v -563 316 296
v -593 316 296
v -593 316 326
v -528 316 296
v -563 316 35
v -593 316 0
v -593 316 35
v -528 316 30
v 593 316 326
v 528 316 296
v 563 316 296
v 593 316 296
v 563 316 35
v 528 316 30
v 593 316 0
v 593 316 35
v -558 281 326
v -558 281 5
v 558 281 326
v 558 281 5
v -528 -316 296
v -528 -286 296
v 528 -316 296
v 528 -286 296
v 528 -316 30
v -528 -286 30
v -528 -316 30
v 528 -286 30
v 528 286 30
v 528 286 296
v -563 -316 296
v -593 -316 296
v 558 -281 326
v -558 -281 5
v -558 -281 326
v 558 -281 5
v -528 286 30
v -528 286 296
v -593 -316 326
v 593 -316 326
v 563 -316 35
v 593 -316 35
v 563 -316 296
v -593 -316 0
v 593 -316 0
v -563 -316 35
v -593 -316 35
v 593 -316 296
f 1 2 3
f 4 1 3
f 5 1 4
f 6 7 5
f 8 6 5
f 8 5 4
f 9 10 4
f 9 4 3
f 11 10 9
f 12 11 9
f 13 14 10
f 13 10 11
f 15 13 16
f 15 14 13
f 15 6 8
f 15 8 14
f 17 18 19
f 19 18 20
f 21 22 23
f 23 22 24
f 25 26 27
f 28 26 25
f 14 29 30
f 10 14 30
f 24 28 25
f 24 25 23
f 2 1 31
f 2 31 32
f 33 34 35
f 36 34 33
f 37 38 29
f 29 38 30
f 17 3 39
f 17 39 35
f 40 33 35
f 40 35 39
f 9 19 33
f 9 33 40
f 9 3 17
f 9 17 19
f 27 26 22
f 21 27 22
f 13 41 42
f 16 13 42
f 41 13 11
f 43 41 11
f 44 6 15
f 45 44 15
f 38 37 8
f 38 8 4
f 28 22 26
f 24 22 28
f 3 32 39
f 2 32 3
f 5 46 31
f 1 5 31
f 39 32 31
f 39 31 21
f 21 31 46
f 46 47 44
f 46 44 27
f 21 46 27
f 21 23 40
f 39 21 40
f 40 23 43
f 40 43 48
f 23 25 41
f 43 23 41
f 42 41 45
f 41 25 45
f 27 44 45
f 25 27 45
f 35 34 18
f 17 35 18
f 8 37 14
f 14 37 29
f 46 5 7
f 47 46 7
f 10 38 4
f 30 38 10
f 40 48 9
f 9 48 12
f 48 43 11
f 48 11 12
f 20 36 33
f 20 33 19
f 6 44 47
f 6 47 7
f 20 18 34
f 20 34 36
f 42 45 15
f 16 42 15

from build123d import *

# Parameters (mm, degrees)
SKETCH_W          = 1186
SKETCH_H          = 632
PAD_DEPTH         = 326
SKETCH001_W       = 30
SKETCH001_H       = 261
POCKET_DEPTH      = 3081.716821
POCKET_DEPTH_BACK = 3081.716821
SKETCH002_W       = 1056
SKETCH002_H       = 266
POCKET001_DEPTH   = 30
SKETCH003_W       = 1116
SKETCH003_H       = 562
POCKET002_DEPTH   = 321.001


with BuildPart() as part:
    # Sketch → Pad (new body)
    with BuildSketch(Plane.XY):
        Rectangle(SKETCH_W, SKETCH_H)
    extrude(amount=PAD_DEPTH)

    # Sketch001 → Pocket (cut, two sides)
    with BuildSketch(Plane.XZ) as pocket_sk:
        with Locations((578, 165.5)):
            Rectangle(SKETCH001_W, SKETCH001_H)
    pocket = extrude(amount=-POCKET_DEPTH, mode=Mode.SUBTRACT) + extrude(pocket_sk.sketch, amount=POCKET_DEPTH_BACK, mode=Mode.SUBTRACT)

    # Mirrored: Pocket across Sketch001 V_Axis
    add(pocket.mirror(Plane(origin=(0, 0, 0), x_dir=(0, -1, 0), z_dir=(1, 0, 0))), mode=Mode.SUBTRACT)

    # Sketch002 → Pocket001 (cut)
    with BuildSketch(Plane.XZ.offset(286)):
        with Locations((0, 163)):
            Rectangle(SKETCH002_W, SKETCH002_H)
    pocket001 = extrude(amount=POCKET001_DEPTH, mode=Mode.SUBTRACT)

    # Mirrored001: Pocket001 across XZ
    add(pocket001.mirror(Plane.XZ), mode=Mode.SUBTRACT)

    # Sketch003 → Pocket002 (cut, through all)
    with BuildSketch(Plane.XY.offset(5)):
        Rectangle(SKETCH003_W, SKETCH003_H)
    extrude(amount=POCKET002_DEPTH, mode=Mode.SUBTRACT)


solid = part.part
